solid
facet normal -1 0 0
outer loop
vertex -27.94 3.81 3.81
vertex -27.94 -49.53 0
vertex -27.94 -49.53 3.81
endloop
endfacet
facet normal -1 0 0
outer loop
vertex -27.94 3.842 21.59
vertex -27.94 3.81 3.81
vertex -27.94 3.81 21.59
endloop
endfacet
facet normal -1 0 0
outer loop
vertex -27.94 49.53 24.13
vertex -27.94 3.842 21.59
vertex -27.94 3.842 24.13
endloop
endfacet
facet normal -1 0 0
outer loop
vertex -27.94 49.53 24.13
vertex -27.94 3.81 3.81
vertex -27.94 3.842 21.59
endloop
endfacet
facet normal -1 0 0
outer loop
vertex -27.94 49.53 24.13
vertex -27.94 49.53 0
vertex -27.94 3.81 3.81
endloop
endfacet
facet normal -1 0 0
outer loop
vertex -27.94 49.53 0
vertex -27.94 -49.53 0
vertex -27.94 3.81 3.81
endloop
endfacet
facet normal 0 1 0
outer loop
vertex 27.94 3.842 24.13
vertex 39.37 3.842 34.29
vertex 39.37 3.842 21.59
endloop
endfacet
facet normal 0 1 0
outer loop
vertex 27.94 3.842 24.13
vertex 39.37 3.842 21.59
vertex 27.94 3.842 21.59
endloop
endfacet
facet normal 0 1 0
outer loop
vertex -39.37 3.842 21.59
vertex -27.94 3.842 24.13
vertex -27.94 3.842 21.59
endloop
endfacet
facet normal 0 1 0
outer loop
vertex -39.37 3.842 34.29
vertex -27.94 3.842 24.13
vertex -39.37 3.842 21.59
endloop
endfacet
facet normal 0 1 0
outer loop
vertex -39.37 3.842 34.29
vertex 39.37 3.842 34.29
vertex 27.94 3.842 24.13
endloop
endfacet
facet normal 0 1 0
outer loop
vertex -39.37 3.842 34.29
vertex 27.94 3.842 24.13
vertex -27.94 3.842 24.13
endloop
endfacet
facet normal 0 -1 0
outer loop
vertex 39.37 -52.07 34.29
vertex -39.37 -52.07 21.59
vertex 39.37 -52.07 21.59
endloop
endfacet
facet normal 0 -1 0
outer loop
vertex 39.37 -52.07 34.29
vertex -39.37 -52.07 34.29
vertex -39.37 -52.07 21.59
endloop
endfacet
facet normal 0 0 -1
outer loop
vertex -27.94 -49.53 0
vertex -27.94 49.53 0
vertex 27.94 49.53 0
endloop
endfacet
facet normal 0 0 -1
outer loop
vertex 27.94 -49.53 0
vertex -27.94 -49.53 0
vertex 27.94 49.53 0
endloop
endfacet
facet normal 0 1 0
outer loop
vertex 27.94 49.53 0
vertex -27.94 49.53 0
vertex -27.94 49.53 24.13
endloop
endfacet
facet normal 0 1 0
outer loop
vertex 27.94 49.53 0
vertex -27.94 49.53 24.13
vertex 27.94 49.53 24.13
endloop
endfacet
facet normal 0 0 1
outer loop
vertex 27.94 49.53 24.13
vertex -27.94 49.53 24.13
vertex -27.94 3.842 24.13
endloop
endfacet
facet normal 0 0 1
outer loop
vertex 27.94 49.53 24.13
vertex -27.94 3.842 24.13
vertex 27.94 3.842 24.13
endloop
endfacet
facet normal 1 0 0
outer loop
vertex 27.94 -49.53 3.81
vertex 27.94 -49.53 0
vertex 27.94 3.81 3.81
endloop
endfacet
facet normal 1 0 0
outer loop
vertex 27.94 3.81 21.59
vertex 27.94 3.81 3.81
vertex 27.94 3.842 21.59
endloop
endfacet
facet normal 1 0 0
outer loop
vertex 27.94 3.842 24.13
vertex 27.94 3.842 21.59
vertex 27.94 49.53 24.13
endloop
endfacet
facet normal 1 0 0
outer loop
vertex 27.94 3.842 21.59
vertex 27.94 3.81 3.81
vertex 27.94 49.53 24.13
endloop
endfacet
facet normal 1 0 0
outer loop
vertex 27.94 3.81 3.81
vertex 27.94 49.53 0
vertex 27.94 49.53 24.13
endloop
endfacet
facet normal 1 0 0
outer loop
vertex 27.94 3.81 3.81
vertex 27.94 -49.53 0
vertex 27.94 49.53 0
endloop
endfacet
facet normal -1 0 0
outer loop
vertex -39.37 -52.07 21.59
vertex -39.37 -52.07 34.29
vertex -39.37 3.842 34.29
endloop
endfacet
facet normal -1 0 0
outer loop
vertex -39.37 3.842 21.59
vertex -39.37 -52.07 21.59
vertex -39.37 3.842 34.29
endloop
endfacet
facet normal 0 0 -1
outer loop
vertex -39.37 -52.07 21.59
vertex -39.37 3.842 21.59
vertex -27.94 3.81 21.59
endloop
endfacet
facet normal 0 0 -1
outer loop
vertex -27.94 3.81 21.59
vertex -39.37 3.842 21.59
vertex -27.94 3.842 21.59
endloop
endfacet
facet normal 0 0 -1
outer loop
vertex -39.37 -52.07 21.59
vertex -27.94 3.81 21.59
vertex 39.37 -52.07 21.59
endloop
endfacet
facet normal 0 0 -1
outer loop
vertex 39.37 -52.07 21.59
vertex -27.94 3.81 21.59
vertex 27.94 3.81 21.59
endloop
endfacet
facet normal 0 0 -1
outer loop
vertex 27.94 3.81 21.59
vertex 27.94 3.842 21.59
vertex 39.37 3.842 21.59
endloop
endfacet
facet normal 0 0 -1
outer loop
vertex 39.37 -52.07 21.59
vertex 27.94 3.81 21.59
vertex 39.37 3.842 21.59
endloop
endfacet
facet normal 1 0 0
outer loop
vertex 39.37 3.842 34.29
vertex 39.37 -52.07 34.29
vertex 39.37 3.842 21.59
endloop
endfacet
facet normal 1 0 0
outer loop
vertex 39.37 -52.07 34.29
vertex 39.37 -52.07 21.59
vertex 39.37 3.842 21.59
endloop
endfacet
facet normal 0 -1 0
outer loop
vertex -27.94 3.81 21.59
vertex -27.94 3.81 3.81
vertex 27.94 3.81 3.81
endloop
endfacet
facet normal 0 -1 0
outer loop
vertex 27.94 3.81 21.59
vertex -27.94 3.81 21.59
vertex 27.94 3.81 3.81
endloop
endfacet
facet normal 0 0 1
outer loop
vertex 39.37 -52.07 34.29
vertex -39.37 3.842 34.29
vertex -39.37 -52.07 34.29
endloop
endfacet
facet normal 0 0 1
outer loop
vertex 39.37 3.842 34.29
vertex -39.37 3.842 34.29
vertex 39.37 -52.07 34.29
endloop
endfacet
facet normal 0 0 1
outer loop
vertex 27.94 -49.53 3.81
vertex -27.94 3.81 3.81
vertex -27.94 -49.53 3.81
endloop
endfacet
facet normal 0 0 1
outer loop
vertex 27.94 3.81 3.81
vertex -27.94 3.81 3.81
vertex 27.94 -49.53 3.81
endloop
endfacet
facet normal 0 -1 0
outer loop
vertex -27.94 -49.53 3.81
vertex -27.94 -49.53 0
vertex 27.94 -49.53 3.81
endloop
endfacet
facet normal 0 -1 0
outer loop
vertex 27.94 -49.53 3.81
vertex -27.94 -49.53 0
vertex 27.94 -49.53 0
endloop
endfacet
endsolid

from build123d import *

# Parameters (mm, degrees)
SKETCH1_W                = 55.88
SKETCH1_H                = 99.06
BOSS_EXTRUDE1_DEPTH      = 3.81
SKETCH2_W                = 55.88
SKETCH2_H                = 45.72
BOSS_EXTRUDE2_DEPTH      = 20.32
SKETCH3_W                = 55.88
SKETCH3_H                = 2.54
BOSS_EXTRUDE3_DEPTH      = 55.88
SKETCH4_W                = 11.43
SKETCH4_H                = 55.911789182
SKETCH4_W_2              = 55.88
BOSS_EXTRUDE4_DEPTH      = 10.16
BOSS_EXTRUDE4_DEPTH_BACK = 2.54


with BuildPart() as part:
    # Sketch1 → Boss-Extrude1 (new body)
    with BuildSketch(Plane.XY):
        Rectangle(SKETCH1_W, SKETCH1_H)
    extrude(amount=BOSS_EXTRUDE1_DEPTH)

    # Sketch2 → Boss-Extrude2 (add)
    with BuildSketch(Plane.XY.offset(3.81)):
        with Locations((0, 26.67)):
            Rectangle(SKETCH2_W, SKETCH2_H)
    extrude(amount=BOSS_EXTRUDE2_DEPTH)

    # Sketch3 → Boss-Extrude3 (add)
    with BuildSketch(Plane.XZ.offset(-3.81)):
        with Locations((0, 22.86)):
            Rectangle(SKETCH3_W, SKETCH3_H)
    extrude(amount=BOSS_EXTRUDE3_DEPTH)

    # Sketch4 → Boss-Extrude4 (add, two sides)
    with BuildSketch(Plane.XY.offset(24.13)) as boss_extrude4_sk:
        with Locations((-33.655, -24.114105409)):
            Rectangle(SKETCH4_W, SKETCH4_H)
        with Locations((0, -24.114105409)):
            Rectangle(SKETCH4_W_2, SKETCH4_H)
        with Locations((33.655, -24.114105409)):
            Rectangle(SKETCH4_W, SKETCH4_H)
    extrude(amount=BOSS_EXTRUDE4_DEPTH)
    extrude(boss_extrude4_sk.sketch, amount=-BOSS_EXTRUDE4_DEPTH_BACK)


solid = part.part
